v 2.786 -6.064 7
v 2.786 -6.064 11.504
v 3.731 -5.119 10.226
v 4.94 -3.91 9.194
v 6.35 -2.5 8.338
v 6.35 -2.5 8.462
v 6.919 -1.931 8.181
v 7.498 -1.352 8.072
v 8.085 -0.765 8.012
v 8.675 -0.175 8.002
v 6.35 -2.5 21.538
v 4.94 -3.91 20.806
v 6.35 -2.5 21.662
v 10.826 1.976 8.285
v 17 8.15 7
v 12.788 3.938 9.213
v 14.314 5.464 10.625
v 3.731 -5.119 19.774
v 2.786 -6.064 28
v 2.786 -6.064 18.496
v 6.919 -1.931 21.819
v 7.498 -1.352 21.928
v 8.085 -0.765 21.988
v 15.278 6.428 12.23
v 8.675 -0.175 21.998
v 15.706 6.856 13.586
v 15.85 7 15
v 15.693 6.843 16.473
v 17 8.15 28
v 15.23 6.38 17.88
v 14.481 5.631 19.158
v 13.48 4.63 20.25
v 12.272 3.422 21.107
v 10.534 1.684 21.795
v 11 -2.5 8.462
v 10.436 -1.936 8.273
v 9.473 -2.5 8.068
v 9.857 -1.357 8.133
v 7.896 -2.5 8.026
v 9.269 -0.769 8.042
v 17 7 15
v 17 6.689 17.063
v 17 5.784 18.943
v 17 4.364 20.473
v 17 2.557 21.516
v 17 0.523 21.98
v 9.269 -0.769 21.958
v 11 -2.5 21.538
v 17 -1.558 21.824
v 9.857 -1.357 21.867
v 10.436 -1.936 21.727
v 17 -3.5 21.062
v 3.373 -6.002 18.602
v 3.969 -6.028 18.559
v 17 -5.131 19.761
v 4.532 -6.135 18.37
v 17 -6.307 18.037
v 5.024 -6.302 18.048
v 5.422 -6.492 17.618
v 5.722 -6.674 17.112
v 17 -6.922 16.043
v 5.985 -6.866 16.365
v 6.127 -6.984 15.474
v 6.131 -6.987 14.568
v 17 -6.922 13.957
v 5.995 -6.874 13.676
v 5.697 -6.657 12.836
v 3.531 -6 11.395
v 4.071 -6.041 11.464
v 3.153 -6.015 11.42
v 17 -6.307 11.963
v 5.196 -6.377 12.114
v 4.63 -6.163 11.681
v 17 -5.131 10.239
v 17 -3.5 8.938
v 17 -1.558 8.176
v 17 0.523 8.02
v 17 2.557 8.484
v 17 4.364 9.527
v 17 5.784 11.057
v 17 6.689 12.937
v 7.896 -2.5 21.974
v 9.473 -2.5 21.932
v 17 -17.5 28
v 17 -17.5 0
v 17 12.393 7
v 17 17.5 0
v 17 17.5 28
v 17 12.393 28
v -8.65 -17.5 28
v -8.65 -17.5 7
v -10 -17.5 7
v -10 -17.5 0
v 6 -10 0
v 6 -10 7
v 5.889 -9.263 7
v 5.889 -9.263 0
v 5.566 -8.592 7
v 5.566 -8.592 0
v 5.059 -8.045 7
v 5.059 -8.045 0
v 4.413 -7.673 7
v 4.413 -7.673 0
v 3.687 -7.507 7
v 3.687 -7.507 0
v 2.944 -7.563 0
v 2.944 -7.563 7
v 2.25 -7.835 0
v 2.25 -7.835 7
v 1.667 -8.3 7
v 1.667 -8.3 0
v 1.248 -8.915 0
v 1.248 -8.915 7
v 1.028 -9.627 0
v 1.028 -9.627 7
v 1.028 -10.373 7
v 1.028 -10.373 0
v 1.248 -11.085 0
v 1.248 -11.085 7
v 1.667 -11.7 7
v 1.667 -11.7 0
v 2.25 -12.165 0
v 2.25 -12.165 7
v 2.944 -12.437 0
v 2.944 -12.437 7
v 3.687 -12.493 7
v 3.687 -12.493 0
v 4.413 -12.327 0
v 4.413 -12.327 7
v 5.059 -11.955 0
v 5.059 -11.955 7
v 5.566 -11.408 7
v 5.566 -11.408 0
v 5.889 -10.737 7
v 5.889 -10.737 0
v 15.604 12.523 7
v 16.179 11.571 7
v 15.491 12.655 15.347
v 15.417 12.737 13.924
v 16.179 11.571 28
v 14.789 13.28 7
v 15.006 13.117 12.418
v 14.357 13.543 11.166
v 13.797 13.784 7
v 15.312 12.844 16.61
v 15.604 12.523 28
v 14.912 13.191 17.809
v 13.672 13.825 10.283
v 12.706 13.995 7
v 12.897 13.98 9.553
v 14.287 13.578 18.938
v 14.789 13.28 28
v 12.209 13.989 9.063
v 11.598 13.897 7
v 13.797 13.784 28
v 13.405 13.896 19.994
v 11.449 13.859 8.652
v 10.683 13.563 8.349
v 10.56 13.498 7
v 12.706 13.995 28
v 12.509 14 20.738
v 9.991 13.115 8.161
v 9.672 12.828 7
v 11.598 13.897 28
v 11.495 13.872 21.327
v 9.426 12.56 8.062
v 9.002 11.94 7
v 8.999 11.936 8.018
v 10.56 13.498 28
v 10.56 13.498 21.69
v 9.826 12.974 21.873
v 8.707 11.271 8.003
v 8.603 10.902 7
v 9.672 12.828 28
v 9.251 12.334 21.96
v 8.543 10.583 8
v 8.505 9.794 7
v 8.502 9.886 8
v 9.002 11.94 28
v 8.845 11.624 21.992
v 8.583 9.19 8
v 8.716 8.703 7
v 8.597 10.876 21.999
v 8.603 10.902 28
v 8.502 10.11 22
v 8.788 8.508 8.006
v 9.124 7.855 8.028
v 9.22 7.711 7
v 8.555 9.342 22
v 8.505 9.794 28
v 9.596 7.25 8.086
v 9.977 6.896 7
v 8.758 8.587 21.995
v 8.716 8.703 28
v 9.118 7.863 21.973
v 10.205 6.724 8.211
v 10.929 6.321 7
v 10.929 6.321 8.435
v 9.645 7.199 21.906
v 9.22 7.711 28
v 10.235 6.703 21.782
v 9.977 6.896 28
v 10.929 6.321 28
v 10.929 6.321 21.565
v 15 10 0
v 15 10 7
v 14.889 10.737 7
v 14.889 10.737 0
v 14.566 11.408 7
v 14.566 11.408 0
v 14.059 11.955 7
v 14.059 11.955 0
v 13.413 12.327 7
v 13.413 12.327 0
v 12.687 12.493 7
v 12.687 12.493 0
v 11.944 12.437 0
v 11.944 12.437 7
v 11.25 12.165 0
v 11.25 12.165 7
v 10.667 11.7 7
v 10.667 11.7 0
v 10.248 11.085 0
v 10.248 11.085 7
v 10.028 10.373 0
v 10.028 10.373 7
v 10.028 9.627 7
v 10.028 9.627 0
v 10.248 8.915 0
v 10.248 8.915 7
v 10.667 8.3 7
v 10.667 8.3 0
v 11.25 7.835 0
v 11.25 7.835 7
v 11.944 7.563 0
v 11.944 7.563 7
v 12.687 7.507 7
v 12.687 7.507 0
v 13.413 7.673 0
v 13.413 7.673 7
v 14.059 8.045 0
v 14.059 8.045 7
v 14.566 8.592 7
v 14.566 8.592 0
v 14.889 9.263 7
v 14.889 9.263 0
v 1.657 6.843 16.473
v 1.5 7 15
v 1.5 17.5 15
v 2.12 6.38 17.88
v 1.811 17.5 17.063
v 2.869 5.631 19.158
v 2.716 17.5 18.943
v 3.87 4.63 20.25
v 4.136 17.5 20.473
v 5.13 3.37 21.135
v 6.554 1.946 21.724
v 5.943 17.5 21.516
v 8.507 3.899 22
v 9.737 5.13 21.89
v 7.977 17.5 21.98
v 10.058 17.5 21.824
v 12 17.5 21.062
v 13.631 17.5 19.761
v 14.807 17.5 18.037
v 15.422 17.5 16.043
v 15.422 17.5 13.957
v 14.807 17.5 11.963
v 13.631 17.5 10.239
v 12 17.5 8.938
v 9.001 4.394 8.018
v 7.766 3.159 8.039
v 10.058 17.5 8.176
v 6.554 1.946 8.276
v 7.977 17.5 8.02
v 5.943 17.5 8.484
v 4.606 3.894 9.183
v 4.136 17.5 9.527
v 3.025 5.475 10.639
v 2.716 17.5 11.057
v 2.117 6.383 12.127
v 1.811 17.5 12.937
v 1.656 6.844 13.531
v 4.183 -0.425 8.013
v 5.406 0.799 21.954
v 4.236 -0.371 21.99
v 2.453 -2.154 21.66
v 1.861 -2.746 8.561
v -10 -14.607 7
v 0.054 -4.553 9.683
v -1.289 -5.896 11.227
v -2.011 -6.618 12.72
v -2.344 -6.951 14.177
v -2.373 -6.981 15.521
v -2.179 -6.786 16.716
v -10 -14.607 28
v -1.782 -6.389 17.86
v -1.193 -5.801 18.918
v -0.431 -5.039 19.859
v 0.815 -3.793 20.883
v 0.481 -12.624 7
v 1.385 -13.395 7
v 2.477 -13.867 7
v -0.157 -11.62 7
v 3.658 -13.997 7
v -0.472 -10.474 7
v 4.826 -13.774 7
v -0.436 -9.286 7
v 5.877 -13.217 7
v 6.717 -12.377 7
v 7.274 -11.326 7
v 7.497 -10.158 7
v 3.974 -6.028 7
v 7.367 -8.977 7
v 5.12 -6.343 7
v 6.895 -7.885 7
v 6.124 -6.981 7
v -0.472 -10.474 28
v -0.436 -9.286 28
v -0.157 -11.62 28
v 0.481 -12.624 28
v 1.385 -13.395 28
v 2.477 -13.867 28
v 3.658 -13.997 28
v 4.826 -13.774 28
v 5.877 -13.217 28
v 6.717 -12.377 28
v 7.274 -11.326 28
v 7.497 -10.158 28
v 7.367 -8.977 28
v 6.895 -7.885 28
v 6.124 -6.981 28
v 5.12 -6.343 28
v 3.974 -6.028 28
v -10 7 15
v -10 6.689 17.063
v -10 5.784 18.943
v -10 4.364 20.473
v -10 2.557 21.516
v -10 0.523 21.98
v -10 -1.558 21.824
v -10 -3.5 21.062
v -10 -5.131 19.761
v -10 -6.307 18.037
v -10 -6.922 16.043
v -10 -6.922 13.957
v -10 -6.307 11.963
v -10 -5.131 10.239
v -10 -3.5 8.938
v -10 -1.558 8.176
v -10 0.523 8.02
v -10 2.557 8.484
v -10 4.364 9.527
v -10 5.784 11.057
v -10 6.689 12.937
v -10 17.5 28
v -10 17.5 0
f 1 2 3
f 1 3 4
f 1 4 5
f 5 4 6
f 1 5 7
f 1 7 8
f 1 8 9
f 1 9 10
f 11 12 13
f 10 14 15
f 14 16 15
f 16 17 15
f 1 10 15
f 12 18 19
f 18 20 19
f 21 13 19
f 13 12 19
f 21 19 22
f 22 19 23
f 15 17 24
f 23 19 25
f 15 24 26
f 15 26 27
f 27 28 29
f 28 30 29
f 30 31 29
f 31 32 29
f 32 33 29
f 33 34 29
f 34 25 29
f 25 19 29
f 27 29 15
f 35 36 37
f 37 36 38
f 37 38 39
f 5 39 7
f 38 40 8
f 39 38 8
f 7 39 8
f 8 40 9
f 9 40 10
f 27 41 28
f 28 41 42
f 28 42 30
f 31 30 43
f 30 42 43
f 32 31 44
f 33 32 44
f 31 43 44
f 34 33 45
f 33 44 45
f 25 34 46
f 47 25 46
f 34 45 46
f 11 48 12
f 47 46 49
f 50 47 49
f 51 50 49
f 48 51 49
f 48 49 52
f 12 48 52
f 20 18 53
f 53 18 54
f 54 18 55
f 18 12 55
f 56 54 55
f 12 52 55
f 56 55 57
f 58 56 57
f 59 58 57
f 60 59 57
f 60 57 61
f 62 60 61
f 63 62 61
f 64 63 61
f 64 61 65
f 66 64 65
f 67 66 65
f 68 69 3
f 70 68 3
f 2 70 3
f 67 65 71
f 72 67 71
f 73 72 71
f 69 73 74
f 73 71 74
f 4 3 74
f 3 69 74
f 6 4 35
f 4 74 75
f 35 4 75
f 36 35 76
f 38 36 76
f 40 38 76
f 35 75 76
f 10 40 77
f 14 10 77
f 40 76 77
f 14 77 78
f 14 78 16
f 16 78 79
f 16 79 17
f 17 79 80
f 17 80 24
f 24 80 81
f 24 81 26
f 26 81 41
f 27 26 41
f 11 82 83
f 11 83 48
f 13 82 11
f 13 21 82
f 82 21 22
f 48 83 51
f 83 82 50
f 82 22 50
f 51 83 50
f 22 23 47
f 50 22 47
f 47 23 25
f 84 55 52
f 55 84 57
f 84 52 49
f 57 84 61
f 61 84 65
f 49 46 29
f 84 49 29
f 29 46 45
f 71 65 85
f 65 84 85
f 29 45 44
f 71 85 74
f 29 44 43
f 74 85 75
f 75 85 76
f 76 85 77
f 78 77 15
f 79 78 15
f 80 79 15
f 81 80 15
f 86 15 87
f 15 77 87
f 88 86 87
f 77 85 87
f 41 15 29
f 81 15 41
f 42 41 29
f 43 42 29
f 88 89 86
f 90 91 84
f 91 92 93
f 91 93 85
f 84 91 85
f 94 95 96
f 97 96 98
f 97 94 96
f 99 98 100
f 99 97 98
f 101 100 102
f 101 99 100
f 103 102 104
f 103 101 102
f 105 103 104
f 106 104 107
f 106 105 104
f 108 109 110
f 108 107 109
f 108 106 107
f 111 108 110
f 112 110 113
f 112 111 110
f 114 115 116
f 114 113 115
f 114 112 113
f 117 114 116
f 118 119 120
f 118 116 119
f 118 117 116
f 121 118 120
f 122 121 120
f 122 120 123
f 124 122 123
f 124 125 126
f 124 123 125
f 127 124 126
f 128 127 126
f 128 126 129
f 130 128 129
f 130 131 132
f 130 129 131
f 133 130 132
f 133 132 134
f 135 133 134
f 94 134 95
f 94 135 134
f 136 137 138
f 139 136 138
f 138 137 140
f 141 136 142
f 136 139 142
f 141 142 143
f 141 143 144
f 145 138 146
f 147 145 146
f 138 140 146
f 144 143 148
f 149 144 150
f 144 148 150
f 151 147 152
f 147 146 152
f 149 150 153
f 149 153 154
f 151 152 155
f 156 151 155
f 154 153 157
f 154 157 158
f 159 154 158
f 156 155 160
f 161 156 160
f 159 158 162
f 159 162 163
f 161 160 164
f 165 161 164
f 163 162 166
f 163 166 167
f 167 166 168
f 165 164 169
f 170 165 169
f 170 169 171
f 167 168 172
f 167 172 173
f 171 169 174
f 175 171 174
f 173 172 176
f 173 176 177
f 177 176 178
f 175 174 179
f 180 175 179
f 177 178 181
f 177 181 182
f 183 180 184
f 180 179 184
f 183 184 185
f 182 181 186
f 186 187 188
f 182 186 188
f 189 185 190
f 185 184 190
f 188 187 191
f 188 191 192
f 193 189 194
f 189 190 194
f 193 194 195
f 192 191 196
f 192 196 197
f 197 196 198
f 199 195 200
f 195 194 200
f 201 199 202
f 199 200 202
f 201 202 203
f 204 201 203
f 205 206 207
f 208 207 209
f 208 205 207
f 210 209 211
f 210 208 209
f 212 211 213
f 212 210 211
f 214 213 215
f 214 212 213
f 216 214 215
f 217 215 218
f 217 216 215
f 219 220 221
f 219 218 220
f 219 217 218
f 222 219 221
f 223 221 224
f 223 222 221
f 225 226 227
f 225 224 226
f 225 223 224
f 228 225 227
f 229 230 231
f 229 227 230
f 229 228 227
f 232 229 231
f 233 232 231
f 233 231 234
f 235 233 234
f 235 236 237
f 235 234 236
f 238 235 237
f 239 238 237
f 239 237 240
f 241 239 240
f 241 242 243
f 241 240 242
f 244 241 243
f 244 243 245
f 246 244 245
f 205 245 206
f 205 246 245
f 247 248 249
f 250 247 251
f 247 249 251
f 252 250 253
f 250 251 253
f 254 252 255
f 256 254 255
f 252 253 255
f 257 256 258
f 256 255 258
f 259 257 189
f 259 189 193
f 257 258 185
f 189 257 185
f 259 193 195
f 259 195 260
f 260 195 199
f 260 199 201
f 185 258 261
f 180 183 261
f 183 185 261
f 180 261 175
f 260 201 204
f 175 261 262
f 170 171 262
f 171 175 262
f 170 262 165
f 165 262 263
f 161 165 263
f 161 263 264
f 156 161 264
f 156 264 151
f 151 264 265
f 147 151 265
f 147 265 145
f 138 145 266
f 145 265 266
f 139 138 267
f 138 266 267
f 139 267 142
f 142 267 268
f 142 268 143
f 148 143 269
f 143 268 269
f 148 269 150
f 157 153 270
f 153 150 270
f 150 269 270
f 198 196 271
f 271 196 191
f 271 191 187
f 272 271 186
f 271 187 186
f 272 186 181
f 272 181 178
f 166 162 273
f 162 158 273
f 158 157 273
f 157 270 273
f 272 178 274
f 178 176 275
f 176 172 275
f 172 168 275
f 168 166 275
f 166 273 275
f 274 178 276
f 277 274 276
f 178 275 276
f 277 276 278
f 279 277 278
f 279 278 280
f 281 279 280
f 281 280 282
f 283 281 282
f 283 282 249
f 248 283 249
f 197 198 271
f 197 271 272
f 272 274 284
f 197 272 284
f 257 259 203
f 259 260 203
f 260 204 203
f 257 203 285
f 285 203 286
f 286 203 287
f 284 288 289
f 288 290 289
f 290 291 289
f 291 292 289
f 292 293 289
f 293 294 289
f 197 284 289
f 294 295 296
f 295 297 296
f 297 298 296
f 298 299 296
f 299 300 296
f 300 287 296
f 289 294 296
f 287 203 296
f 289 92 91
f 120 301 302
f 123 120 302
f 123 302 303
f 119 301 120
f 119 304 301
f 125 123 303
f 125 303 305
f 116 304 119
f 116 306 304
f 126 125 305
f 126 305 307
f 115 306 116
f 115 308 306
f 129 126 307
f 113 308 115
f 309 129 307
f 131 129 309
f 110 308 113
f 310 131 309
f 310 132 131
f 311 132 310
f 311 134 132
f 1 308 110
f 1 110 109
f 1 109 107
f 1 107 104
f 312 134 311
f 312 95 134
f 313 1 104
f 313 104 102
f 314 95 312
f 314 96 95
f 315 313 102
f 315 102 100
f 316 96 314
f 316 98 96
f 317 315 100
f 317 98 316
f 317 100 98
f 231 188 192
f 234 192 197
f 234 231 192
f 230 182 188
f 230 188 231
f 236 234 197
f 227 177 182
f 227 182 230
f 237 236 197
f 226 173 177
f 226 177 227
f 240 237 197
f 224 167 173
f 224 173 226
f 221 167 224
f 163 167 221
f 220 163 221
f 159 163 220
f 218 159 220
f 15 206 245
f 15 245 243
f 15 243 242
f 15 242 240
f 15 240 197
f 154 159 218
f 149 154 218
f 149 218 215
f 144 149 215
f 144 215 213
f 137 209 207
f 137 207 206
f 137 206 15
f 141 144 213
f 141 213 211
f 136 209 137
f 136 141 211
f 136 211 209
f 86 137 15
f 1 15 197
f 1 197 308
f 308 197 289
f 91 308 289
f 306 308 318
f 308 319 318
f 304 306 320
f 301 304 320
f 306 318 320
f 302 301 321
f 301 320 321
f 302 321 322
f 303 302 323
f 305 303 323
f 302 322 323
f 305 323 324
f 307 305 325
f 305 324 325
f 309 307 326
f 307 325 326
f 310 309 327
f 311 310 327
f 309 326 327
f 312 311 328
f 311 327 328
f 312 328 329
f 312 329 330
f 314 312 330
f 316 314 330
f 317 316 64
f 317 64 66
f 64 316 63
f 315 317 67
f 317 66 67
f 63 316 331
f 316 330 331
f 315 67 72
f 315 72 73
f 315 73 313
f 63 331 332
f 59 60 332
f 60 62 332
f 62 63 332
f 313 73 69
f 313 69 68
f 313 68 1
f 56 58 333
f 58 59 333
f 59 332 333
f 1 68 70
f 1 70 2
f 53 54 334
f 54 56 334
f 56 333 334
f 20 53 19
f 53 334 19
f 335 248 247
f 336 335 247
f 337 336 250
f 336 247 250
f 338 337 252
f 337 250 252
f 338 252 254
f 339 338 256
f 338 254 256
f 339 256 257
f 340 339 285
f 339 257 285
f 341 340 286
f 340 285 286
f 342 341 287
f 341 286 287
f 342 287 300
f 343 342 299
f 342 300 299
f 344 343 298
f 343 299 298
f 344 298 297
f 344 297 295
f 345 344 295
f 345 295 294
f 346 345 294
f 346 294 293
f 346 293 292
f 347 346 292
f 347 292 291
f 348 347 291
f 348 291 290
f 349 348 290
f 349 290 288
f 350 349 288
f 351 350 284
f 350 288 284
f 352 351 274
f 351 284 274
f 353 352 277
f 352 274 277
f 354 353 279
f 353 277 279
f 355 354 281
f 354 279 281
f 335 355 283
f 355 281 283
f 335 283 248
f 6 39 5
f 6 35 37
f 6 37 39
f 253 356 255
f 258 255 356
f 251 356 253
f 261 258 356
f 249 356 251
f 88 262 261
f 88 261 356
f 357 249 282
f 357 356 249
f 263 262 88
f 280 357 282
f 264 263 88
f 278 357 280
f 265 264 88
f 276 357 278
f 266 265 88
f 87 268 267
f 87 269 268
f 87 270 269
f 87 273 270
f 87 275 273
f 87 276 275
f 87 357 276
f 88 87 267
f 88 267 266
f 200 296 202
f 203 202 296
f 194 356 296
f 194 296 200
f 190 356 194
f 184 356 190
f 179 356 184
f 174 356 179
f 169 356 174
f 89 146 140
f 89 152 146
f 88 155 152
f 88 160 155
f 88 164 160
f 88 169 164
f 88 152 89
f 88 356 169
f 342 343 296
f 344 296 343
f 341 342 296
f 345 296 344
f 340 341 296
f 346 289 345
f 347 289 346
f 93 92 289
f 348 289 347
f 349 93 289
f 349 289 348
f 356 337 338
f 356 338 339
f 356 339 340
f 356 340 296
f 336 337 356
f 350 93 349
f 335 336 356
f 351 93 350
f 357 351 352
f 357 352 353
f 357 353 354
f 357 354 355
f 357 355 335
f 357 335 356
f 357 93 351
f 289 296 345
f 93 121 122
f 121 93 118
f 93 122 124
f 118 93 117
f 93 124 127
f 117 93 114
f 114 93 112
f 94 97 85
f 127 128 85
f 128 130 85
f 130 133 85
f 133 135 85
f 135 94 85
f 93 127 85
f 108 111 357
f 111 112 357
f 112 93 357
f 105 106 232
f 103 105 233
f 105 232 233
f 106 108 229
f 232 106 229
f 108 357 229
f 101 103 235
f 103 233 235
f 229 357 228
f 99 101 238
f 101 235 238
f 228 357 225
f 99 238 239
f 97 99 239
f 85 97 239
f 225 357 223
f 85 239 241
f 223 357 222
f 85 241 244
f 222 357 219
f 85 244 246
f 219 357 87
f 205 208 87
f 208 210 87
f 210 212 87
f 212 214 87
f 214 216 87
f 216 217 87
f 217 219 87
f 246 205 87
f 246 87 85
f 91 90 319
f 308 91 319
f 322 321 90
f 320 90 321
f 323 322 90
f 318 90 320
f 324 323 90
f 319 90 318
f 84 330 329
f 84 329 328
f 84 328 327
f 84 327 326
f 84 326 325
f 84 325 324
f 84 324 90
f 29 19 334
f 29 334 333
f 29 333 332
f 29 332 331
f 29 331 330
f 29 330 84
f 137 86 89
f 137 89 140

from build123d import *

# Parameters (mm, degrees)
SKETCH_W        = 27
SKETCH_H        = 35
SKETCH_R        = 2.5
PAD_DEPTH       = 28
POCKET_DEPTH    = 21
SKETCH002_R     = 7
POCKET001_DEPTH = 20
SKETCH003_R     = 7
POCKET002_DEPTH = 27.001
SKETCH004_R     = 4
POCKET003_DEPTH = 21


with BuildPart() as part:
    # Sketch → Pad (new body)
    with BuildSketch(Plane.XY):
        with Locations((3.5, 0)):
            Rectangle(SKETCH_W, SKETCH_H)
        with Locations((3.5, -10)):
            Circle(SKETCH_R, mode=Mode.SUBTRACT)
        with Locations((12.5, 10)):
            Circle(SKETCH_R, mode=Mode.SUBTRACT)
    extrude(amount=PAD_DEPTH)

    # Sketch001 (on Face1 of CopyCut001) → Pocket (cut)
    with BuildSketch(Plane.XY.offset(28)):
        Polygon((17, 12.392641), (-10, -14.607359), (-10, -18.85), (17, 8.15), align=None)
    extrude(amount=-POCKET_DEPTH, mode=Mode.SUBTRACT)

    # Sketch002 (on Face1 of Pocket) → Pocket001 (cut)
    with BuildSketch(Plane(origin=(0, 17.5, 0), x_dir=(-1, 0, 0), z_dir=(0, 1, 0))):
        with Locations((-8.5, 15)):
            Circle(SKETCH002_R)
    extrude(amount=-POCKET001_DEPTH, mode=Mode.SUBTRACT)

    # Sketch003 (on Face5 of Pocket001) → Pocket002 (cut, through all)
    with BuildSketch(Plane.YZ.offset(17)):
        with Locations((0, 15)):
            Circle(SKETCH003_R)
    extrude(amount=-POCKET002_DEPTH, mode=Mode.SUBTRACT)

    # Sketch004 (on Sketch) → Pocket003 (cut)
    with BuildSketch(Plane(origin=(8, 0, 28), x_dir=(0.911922, -0.410365, 0), z_dir=(0, 0, 1))):
        with Locations((0, 10.965856)):
            Circle(SKETCH004_R)
        with Locations((0, -10.965856)):
            Circle(SKETCH004_R)
    extrude(amount=-POCKET003_DEPTH, mode=Mode.SUBTRACT)


solid = part.part
